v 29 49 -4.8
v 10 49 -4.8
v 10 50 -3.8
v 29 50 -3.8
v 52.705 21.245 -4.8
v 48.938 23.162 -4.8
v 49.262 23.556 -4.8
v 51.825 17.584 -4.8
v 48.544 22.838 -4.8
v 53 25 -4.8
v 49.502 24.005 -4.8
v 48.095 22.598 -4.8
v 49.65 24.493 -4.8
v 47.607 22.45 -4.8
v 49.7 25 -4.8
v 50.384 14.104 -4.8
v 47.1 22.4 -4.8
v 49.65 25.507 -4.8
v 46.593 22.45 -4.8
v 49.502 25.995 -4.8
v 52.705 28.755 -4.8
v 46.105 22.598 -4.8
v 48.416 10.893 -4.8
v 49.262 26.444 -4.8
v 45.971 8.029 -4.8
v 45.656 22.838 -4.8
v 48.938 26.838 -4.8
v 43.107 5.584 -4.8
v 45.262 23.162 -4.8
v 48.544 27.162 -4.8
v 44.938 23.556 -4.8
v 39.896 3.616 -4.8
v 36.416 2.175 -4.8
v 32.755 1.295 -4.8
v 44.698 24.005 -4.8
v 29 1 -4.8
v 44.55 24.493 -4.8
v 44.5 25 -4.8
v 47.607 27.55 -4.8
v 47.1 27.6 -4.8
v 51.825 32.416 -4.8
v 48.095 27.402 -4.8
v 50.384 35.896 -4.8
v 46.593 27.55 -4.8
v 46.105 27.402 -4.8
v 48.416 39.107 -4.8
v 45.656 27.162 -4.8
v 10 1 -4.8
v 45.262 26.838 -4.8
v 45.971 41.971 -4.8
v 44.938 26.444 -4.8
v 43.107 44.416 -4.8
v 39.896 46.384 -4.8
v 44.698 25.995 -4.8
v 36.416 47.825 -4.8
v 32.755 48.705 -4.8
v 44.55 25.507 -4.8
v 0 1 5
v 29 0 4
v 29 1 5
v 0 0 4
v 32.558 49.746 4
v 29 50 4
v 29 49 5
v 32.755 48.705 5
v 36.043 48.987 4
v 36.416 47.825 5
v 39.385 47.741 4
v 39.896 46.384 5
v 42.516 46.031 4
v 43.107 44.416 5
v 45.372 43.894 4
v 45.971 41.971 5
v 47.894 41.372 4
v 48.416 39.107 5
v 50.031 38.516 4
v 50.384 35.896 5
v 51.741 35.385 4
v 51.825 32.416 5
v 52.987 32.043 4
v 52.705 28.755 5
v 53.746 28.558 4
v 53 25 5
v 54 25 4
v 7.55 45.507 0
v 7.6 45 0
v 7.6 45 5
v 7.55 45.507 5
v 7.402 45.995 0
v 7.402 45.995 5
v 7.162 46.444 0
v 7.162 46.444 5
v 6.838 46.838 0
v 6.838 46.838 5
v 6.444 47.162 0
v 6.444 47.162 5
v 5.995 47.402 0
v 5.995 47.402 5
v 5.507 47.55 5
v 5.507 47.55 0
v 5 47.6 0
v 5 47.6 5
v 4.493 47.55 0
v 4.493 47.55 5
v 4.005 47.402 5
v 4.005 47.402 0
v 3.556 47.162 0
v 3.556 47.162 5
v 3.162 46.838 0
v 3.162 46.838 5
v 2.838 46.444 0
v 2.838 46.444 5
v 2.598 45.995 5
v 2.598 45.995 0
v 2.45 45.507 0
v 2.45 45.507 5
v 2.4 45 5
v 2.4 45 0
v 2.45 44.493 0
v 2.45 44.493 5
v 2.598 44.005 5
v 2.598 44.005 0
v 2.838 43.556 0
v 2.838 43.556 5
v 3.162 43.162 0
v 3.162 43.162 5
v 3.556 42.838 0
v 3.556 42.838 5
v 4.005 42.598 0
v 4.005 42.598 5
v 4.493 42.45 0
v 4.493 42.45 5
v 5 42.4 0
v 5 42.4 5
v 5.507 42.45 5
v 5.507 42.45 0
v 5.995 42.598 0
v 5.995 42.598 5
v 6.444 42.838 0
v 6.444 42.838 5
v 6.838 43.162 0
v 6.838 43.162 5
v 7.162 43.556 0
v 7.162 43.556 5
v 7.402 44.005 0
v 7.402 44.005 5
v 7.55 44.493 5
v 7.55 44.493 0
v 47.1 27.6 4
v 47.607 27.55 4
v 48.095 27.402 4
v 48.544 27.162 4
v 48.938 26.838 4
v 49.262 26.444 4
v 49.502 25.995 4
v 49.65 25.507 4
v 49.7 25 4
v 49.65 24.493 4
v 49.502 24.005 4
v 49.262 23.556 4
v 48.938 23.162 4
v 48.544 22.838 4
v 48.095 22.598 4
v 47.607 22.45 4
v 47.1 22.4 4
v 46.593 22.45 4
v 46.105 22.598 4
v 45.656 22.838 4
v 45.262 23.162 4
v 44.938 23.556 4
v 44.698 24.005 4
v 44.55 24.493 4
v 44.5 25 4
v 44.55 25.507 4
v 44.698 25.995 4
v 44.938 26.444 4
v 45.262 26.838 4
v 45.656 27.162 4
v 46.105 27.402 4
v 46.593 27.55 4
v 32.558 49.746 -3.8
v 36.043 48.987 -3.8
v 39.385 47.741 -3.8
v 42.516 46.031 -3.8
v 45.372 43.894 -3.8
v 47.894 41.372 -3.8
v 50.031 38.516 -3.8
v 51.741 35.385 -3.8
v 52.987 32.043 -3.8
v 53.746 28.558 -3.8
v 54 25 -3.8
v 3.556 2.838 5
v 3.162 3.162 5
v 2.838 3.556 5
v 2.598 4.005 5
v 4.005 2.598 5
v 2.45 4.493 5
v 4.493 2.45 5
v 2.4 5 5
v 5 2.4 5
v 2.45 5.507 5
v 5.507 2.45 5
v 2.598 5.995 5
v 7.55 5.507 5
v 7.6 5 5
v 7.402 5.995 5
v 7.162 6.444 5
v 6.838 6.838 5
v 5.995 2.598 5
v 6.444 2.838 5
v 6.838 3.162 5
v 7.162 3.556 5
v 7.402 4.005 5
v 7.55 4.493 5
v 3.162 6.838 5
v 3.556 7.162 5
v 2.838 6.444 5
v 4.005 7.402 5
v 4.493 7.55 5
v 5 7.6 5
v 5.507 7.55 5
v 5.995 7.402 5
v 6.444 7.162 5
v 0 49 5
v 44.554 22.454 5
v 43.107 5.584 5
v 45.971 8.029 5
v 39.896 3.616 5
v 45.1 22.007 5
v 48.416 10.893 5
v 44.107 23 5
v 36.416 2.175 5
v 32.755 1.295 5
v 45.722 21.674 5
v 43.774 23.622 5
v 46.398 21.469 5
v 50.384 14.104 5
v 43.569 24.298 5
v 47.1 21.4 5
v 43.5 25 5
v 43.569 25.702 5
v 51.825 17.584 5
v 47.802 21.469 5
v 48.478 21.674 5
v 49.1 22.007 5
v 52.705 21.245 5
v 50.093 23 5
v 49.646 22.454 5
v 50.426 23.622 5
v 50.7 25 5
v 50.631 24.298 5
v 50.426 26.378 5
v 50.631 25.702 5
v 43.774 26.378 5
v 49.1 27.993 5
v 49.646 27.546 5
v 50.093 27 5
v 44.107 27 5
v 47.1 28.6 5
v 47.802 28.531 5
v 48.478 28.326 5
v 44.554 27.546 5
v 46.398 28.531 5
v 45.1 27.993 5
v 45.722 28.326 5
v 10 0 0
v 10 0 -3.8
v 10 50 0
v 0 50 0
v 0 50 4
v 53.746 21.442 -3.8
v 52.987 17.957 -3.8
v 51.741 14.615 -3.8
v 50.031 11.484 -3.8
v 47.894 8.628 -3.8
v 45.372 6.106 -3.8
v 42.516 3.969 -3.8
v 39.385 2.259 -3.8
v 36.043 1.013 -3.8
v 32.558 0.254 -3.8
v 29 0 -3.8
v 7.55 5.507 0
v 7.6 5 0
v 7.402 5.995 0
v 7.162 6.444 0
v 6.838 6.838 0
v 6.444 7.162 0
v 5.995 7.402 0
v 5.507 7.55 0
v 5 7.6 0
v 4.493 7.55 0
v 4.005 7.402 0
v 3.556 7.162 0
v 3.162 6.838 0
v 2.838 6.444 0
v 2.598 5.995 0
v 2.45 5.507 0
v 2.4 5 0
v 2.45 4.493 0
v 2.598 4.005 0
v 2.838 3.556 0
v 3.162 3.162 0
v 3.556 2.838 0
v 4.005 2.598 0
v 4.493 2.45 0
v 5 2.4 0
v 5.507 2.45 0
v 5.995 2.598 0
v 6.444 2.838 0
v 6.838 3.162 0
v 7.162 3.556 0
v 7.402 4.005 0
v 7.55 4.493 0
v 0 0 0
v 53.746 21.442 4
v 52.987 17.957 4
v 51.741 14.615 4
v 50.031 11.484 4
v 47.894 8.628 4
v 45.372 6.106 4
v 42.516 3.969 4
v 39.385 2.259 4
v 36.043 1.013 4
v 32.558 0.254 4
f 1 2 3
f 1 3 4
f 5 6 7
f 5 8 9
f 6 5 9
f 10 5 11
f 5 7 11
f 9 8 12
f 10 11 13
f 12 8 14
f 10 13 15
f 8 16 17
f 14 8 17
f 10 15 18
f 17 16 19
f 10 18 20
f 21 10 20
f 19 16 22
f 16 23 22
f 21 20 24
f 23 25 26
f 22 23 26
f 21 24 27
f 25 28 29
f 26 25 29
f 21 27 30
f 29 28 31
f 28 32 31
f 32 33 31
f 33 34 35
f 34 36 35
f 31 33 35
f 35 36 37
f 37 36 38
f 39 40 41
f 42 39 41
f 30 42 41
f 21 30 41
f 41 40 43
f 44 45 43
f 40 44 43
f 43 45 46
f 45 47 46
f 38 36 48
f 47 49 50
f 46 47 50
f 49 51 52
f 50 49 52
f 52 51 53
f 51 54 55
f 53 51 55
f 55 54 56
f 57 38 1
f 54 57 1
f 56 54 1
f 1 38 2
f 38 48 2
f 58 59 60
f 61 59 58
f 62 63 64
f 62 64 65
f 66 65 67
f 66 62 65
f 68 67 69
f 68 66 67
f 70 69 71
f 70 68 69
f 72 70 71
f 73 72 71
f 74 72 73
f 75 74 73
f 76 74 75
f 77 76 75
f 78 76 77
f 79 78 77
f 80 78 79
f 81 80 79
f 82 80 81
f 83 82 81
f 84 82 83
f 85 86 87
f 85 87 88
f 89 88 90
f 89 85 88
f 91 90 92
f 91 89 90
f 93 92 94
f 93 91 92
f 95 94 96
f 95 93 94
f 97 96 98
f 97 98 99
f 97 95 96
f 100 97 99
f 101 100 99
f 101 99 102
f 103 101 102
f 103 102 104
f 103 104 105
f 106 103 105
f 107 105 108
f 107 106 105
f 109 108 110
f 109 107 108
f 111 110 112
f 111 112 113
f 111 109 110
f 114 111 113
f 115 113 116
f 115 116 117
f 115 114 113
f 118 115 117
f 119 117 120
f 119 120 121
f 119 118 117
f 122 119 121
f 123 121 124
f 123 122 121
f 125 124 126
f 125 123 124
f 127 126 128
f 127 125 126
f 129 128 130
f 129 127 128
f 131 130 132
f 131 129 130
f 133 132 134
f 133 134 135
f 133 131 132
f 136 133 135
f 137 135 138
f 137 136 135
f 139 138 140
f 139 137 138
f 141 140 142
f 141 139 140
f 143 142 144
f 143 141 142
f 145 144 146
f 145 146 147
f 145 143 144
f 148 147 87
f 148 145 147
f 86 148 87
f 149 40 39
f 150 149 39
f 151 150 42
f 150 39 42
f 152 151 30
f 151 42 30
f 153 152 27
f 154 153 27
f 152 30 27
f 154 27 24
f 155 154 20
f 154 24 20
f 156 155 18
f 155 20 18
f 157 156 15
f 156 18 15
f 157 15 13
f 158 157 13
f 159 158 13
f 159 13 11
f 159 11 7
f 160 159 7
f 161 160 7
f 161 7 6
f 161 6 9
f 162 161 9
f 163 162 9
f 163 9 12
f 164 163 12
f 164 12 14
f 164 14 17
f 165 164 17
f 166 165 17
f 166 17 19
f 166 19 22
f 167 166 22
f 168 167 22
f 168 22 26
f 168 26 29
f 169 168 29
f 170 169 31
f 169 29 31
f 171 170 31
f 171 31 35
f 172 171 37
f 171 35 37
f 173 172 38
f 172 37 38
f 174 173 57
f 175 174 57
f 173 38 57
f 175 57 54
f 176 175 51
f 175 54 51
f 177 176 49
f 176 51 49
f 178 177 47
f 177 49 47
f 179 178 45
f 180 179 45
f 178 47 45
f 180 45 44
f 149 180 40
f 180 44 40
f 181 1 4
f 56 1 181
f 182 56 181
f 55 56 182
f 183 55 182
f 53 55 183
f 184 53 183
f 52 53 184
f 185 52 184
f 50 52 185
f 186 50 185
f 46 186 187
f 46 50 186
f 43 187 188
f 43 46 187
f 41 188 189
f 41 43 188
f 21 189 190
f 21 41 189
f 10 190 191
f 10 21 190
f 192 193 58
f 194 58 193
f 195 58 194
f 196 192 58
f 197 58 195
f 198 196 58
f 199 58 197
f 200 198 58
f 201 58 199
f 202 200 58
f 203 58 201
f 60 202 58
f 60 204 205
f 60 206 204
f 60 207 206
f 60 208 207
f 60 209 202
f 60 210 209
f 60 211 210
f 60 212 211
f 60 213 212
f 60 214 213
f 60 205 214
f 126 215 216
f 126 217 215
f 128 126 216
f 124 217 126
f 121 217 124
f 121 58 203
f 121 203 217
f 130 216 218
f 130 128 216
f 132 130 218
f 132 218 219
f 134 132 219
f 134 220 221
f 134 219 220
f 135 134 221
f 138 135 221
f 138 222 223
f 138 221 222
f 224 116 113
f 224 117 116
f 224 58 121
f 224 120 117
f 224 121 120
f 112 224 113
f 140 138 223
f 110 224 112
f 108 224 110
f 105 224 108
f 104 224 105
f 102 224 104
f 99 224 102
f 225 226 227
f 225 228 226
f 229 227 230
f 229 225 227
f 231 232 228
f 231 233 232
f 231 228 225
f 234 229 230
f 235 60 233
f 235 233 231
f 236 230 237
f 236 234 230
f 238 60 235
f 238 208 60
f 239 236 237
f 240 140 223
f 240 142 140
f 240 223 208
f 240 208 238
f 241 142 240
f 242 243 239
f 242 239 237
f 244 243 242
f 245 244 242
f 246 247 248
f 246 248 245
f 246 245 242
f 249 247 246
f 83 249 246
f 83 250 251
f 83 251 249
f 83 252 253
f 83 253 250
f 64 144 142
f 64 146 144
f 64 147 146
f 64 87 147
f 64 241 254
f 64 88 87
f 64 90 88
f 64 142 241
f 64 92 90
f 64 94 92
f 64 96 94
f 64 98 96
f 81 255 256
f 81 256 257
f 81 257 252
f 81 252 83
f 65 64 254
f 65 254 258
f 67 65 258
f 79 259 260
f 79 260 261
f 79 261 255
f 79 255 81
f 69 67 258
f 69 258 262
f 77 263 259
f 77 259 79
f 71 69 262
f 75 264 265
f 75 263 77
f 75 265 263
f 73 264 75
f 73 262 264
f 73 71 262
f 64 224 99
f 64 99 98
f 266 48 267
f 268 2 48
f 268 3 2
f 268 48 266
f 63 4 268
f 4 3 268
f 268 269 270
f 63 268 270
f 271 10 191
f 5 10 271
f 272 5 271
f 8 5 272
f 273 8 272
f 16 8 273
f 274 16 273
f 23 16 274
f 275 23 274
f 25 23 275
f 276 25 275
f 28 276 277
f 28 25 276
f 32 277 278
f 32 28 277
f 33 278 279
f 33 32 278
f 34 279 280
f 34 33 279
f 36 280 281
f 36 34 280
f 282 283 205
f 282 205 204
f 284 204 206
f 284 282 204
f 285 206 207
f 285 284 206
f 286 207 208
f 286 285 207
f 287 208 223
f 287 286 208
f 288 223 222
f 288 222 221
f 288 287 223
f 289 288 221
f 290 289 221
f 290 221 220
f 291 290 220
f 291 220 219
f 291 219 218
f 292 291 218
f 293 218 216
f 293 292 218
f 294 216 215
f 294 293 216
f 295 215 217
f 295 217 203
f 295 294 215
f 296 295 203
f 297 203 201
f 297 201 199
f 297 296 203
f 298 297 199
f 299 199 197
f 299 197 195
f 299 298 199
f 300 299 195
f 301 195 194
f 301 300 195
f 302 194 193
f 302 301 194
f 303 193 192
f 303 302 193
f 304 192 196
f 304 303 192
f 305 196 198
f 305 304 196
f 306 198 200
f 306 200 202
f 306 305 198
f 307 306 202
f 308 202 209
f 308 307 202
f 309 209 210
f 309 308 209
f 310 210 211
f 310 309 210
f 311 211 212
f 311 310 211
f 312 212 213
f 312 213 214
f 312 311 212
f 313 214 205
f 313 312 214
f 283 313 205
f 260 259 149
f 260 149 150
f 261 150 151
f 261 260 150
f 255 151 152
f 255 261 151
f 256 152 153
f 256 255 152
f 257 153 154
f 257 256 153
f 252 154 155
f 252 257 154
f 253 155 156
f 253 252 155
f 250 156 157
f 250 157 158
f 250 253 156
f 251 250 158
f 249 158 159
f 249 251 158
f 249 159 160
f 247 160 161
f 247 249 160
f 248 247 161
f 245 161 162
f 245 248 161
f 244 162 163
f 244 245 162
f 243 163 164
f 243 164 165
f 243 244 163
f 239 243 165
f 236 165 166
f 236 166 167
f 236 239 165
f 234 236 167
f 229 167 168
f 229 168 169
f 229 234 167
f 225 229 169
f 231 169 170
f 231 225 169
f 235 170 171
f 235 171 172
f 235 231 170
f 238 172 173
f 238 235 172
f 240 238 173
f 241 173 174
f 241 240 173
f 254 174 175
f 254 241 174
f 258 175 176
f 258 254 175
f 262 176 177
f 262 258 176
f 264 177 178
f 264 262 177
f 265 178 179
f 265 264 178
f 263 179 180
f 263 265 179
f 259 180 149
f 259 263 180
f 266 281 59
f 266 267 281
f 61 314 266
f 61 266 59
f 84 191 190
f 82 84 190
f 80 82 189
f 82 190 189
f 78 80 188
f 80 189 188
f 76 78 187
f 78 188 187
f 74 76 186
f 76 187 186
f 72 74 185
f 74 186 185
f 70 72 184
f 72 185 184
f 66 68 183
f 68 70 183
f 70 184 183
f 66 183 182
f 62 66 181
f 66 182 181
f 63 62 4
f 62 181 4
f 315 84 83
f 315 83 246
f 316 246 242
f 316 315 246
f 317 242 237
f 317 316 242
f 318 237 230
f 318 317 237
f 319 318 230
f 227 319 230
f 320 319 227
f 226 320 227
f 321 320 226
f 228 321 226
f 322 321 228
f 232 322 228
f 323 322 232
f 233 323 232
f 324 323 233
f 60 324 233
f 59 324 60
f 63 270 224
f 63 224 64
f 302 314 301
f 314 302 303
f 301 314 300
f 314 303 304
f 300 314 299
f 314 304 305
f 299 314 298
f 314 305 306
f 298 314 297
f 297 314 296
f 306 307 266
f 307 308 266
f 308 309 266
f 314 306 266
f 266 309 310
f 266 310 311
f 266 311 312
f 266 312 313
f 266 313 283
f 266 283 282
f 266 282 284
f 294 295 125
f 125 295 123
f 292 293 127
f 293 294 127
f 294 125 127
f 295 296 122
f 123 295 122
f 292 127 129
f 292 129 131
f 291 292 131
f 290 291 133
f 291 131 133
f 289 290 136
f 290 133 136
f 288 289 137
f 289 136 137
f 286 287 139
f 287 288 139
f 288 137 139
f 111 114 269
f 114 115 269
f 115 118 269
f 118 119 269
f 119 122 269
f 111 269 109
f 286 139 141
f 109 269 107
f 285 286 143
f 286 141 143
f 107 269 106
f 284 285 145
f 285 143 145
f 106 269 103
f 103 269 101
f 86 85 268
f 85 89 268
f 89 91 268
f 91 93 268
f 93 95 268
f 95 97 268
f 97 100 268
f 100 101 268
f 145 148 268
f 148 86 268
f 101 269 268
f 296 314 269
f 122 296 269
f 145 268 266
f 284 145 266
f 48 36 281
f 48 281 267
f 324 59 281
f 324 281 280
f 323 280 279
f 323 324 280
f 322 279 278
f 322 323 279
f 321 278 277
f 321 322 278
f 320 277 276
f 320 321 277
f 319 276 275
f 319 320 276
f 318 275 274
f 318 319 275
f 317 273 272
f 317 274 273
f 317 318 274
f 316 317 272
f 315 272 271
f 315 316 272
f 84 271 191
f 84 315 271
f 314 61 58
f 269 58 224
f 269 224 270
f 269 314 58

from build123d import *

# Parameters (mm, degrees)
SKETCH1_W           = 54
SKETCH1_H           = 50
SKETCH1_R           = 2.6
BOSS_EXTRUDE1_DEPTH = 5
SKETCH2_W           = 4.8
SKETCH2_H           = 50
BOSS_EXTRUDE2_DEPTH = 44
SKETCH3_R           = 2.6
CUT_EXTRUDE1_DEPTH  = 10
FILLET1_R           = 25
CHAMFER1_SIZE       = 1
CHAMFER2_SIZE       = 1
CHAMFER3_SIZE       = 1


with BuildPart() as part:
    # Sketch1 → Boss-Extrude1 (new body)
    with BuildSketch(Plane.XY):
        with Locations((27, 25)):
            Rectangle(SKETCH1_W, SKETCH1_H)
        with Locations((5, 45)):
            Circle(SKETCH1_R, mode=Mode.SUBTRACT)
        with Locations((5, 5)):
            Circle(SKETCH1_R, mode=Mode.SUBTRACT)
    extrude(amount=BOSS_EXTRUDE1_DEPTH)

    # Sketch2 → Boss-Extrude2 (add)
    with BuildSketch(Plane.ZY.offset(-10)):
        with Locations((-2.4, 25)):
            Rectangle(SKETCH2_W, SKETCH2_H)
    extrude(amount=-BOSS_EXTRUDE2_DEPTH)

    # Sketch3 → Cut-Extrude1 (cut)
    with BuildSketch(Plane(origin=(0, 0, -4.8), x_dir=(-1, 0, 0), z_dir=(0, 0, -1))):
        with Locations(Location((-47.1, 25, 0), (0, 0, 90))):
            Circle(SKETCH3_R)
    extrude(amount=-CUT_EXTRUDE1_DEPTH, mode=Mode.SUBTRACT)

    # Fillet1
    fillet1_edges = [part.edges().sort_by_distance(p)[0] for p in [
        (54, 0, 0.1),
        (54, 50, 0.1),
    ]]
    fillet(fillet1_edges, radius=FILLET1_R - 0.0001)  # a hair under: the kernel refuses the full size

    # Chamfer1
    chamfer1_edges = [part.edges().sort_by_distance(p)[0] for p in [
        (47.1, 22.4, 5),
    ]]
    chamfer(chamfer1_edges, length=CHAMFER1_SIZE)

    # Chamfer2
    chamfer2_edges = [part.edges().sort_by_distance(p)[0] for p in [
        (14.50005, 50, 5),
        (46.677698819, 42.677698819, 5),
        (46.677698819, 7.322301181, 5),
        (14.50005, 0, 5),
    ]]
    chamfer(chamfer2_edges, length=CHAMFER2_SIZE)

    # Chamfer3
    chamfer3_edges = [part.edges().sort_by_distance(p)[0] for p in [
        (19.50005, 50, -4.8),
        (19.50005, 0, -4.8),
        (46.677698819, 42.677698819, -4.8),
        (46.677698819, 7.322301181, -4.8),
    ]]
    chamfer(chamfer3_edges, length=CHAMFER3_SIZE)


solid = part.part
